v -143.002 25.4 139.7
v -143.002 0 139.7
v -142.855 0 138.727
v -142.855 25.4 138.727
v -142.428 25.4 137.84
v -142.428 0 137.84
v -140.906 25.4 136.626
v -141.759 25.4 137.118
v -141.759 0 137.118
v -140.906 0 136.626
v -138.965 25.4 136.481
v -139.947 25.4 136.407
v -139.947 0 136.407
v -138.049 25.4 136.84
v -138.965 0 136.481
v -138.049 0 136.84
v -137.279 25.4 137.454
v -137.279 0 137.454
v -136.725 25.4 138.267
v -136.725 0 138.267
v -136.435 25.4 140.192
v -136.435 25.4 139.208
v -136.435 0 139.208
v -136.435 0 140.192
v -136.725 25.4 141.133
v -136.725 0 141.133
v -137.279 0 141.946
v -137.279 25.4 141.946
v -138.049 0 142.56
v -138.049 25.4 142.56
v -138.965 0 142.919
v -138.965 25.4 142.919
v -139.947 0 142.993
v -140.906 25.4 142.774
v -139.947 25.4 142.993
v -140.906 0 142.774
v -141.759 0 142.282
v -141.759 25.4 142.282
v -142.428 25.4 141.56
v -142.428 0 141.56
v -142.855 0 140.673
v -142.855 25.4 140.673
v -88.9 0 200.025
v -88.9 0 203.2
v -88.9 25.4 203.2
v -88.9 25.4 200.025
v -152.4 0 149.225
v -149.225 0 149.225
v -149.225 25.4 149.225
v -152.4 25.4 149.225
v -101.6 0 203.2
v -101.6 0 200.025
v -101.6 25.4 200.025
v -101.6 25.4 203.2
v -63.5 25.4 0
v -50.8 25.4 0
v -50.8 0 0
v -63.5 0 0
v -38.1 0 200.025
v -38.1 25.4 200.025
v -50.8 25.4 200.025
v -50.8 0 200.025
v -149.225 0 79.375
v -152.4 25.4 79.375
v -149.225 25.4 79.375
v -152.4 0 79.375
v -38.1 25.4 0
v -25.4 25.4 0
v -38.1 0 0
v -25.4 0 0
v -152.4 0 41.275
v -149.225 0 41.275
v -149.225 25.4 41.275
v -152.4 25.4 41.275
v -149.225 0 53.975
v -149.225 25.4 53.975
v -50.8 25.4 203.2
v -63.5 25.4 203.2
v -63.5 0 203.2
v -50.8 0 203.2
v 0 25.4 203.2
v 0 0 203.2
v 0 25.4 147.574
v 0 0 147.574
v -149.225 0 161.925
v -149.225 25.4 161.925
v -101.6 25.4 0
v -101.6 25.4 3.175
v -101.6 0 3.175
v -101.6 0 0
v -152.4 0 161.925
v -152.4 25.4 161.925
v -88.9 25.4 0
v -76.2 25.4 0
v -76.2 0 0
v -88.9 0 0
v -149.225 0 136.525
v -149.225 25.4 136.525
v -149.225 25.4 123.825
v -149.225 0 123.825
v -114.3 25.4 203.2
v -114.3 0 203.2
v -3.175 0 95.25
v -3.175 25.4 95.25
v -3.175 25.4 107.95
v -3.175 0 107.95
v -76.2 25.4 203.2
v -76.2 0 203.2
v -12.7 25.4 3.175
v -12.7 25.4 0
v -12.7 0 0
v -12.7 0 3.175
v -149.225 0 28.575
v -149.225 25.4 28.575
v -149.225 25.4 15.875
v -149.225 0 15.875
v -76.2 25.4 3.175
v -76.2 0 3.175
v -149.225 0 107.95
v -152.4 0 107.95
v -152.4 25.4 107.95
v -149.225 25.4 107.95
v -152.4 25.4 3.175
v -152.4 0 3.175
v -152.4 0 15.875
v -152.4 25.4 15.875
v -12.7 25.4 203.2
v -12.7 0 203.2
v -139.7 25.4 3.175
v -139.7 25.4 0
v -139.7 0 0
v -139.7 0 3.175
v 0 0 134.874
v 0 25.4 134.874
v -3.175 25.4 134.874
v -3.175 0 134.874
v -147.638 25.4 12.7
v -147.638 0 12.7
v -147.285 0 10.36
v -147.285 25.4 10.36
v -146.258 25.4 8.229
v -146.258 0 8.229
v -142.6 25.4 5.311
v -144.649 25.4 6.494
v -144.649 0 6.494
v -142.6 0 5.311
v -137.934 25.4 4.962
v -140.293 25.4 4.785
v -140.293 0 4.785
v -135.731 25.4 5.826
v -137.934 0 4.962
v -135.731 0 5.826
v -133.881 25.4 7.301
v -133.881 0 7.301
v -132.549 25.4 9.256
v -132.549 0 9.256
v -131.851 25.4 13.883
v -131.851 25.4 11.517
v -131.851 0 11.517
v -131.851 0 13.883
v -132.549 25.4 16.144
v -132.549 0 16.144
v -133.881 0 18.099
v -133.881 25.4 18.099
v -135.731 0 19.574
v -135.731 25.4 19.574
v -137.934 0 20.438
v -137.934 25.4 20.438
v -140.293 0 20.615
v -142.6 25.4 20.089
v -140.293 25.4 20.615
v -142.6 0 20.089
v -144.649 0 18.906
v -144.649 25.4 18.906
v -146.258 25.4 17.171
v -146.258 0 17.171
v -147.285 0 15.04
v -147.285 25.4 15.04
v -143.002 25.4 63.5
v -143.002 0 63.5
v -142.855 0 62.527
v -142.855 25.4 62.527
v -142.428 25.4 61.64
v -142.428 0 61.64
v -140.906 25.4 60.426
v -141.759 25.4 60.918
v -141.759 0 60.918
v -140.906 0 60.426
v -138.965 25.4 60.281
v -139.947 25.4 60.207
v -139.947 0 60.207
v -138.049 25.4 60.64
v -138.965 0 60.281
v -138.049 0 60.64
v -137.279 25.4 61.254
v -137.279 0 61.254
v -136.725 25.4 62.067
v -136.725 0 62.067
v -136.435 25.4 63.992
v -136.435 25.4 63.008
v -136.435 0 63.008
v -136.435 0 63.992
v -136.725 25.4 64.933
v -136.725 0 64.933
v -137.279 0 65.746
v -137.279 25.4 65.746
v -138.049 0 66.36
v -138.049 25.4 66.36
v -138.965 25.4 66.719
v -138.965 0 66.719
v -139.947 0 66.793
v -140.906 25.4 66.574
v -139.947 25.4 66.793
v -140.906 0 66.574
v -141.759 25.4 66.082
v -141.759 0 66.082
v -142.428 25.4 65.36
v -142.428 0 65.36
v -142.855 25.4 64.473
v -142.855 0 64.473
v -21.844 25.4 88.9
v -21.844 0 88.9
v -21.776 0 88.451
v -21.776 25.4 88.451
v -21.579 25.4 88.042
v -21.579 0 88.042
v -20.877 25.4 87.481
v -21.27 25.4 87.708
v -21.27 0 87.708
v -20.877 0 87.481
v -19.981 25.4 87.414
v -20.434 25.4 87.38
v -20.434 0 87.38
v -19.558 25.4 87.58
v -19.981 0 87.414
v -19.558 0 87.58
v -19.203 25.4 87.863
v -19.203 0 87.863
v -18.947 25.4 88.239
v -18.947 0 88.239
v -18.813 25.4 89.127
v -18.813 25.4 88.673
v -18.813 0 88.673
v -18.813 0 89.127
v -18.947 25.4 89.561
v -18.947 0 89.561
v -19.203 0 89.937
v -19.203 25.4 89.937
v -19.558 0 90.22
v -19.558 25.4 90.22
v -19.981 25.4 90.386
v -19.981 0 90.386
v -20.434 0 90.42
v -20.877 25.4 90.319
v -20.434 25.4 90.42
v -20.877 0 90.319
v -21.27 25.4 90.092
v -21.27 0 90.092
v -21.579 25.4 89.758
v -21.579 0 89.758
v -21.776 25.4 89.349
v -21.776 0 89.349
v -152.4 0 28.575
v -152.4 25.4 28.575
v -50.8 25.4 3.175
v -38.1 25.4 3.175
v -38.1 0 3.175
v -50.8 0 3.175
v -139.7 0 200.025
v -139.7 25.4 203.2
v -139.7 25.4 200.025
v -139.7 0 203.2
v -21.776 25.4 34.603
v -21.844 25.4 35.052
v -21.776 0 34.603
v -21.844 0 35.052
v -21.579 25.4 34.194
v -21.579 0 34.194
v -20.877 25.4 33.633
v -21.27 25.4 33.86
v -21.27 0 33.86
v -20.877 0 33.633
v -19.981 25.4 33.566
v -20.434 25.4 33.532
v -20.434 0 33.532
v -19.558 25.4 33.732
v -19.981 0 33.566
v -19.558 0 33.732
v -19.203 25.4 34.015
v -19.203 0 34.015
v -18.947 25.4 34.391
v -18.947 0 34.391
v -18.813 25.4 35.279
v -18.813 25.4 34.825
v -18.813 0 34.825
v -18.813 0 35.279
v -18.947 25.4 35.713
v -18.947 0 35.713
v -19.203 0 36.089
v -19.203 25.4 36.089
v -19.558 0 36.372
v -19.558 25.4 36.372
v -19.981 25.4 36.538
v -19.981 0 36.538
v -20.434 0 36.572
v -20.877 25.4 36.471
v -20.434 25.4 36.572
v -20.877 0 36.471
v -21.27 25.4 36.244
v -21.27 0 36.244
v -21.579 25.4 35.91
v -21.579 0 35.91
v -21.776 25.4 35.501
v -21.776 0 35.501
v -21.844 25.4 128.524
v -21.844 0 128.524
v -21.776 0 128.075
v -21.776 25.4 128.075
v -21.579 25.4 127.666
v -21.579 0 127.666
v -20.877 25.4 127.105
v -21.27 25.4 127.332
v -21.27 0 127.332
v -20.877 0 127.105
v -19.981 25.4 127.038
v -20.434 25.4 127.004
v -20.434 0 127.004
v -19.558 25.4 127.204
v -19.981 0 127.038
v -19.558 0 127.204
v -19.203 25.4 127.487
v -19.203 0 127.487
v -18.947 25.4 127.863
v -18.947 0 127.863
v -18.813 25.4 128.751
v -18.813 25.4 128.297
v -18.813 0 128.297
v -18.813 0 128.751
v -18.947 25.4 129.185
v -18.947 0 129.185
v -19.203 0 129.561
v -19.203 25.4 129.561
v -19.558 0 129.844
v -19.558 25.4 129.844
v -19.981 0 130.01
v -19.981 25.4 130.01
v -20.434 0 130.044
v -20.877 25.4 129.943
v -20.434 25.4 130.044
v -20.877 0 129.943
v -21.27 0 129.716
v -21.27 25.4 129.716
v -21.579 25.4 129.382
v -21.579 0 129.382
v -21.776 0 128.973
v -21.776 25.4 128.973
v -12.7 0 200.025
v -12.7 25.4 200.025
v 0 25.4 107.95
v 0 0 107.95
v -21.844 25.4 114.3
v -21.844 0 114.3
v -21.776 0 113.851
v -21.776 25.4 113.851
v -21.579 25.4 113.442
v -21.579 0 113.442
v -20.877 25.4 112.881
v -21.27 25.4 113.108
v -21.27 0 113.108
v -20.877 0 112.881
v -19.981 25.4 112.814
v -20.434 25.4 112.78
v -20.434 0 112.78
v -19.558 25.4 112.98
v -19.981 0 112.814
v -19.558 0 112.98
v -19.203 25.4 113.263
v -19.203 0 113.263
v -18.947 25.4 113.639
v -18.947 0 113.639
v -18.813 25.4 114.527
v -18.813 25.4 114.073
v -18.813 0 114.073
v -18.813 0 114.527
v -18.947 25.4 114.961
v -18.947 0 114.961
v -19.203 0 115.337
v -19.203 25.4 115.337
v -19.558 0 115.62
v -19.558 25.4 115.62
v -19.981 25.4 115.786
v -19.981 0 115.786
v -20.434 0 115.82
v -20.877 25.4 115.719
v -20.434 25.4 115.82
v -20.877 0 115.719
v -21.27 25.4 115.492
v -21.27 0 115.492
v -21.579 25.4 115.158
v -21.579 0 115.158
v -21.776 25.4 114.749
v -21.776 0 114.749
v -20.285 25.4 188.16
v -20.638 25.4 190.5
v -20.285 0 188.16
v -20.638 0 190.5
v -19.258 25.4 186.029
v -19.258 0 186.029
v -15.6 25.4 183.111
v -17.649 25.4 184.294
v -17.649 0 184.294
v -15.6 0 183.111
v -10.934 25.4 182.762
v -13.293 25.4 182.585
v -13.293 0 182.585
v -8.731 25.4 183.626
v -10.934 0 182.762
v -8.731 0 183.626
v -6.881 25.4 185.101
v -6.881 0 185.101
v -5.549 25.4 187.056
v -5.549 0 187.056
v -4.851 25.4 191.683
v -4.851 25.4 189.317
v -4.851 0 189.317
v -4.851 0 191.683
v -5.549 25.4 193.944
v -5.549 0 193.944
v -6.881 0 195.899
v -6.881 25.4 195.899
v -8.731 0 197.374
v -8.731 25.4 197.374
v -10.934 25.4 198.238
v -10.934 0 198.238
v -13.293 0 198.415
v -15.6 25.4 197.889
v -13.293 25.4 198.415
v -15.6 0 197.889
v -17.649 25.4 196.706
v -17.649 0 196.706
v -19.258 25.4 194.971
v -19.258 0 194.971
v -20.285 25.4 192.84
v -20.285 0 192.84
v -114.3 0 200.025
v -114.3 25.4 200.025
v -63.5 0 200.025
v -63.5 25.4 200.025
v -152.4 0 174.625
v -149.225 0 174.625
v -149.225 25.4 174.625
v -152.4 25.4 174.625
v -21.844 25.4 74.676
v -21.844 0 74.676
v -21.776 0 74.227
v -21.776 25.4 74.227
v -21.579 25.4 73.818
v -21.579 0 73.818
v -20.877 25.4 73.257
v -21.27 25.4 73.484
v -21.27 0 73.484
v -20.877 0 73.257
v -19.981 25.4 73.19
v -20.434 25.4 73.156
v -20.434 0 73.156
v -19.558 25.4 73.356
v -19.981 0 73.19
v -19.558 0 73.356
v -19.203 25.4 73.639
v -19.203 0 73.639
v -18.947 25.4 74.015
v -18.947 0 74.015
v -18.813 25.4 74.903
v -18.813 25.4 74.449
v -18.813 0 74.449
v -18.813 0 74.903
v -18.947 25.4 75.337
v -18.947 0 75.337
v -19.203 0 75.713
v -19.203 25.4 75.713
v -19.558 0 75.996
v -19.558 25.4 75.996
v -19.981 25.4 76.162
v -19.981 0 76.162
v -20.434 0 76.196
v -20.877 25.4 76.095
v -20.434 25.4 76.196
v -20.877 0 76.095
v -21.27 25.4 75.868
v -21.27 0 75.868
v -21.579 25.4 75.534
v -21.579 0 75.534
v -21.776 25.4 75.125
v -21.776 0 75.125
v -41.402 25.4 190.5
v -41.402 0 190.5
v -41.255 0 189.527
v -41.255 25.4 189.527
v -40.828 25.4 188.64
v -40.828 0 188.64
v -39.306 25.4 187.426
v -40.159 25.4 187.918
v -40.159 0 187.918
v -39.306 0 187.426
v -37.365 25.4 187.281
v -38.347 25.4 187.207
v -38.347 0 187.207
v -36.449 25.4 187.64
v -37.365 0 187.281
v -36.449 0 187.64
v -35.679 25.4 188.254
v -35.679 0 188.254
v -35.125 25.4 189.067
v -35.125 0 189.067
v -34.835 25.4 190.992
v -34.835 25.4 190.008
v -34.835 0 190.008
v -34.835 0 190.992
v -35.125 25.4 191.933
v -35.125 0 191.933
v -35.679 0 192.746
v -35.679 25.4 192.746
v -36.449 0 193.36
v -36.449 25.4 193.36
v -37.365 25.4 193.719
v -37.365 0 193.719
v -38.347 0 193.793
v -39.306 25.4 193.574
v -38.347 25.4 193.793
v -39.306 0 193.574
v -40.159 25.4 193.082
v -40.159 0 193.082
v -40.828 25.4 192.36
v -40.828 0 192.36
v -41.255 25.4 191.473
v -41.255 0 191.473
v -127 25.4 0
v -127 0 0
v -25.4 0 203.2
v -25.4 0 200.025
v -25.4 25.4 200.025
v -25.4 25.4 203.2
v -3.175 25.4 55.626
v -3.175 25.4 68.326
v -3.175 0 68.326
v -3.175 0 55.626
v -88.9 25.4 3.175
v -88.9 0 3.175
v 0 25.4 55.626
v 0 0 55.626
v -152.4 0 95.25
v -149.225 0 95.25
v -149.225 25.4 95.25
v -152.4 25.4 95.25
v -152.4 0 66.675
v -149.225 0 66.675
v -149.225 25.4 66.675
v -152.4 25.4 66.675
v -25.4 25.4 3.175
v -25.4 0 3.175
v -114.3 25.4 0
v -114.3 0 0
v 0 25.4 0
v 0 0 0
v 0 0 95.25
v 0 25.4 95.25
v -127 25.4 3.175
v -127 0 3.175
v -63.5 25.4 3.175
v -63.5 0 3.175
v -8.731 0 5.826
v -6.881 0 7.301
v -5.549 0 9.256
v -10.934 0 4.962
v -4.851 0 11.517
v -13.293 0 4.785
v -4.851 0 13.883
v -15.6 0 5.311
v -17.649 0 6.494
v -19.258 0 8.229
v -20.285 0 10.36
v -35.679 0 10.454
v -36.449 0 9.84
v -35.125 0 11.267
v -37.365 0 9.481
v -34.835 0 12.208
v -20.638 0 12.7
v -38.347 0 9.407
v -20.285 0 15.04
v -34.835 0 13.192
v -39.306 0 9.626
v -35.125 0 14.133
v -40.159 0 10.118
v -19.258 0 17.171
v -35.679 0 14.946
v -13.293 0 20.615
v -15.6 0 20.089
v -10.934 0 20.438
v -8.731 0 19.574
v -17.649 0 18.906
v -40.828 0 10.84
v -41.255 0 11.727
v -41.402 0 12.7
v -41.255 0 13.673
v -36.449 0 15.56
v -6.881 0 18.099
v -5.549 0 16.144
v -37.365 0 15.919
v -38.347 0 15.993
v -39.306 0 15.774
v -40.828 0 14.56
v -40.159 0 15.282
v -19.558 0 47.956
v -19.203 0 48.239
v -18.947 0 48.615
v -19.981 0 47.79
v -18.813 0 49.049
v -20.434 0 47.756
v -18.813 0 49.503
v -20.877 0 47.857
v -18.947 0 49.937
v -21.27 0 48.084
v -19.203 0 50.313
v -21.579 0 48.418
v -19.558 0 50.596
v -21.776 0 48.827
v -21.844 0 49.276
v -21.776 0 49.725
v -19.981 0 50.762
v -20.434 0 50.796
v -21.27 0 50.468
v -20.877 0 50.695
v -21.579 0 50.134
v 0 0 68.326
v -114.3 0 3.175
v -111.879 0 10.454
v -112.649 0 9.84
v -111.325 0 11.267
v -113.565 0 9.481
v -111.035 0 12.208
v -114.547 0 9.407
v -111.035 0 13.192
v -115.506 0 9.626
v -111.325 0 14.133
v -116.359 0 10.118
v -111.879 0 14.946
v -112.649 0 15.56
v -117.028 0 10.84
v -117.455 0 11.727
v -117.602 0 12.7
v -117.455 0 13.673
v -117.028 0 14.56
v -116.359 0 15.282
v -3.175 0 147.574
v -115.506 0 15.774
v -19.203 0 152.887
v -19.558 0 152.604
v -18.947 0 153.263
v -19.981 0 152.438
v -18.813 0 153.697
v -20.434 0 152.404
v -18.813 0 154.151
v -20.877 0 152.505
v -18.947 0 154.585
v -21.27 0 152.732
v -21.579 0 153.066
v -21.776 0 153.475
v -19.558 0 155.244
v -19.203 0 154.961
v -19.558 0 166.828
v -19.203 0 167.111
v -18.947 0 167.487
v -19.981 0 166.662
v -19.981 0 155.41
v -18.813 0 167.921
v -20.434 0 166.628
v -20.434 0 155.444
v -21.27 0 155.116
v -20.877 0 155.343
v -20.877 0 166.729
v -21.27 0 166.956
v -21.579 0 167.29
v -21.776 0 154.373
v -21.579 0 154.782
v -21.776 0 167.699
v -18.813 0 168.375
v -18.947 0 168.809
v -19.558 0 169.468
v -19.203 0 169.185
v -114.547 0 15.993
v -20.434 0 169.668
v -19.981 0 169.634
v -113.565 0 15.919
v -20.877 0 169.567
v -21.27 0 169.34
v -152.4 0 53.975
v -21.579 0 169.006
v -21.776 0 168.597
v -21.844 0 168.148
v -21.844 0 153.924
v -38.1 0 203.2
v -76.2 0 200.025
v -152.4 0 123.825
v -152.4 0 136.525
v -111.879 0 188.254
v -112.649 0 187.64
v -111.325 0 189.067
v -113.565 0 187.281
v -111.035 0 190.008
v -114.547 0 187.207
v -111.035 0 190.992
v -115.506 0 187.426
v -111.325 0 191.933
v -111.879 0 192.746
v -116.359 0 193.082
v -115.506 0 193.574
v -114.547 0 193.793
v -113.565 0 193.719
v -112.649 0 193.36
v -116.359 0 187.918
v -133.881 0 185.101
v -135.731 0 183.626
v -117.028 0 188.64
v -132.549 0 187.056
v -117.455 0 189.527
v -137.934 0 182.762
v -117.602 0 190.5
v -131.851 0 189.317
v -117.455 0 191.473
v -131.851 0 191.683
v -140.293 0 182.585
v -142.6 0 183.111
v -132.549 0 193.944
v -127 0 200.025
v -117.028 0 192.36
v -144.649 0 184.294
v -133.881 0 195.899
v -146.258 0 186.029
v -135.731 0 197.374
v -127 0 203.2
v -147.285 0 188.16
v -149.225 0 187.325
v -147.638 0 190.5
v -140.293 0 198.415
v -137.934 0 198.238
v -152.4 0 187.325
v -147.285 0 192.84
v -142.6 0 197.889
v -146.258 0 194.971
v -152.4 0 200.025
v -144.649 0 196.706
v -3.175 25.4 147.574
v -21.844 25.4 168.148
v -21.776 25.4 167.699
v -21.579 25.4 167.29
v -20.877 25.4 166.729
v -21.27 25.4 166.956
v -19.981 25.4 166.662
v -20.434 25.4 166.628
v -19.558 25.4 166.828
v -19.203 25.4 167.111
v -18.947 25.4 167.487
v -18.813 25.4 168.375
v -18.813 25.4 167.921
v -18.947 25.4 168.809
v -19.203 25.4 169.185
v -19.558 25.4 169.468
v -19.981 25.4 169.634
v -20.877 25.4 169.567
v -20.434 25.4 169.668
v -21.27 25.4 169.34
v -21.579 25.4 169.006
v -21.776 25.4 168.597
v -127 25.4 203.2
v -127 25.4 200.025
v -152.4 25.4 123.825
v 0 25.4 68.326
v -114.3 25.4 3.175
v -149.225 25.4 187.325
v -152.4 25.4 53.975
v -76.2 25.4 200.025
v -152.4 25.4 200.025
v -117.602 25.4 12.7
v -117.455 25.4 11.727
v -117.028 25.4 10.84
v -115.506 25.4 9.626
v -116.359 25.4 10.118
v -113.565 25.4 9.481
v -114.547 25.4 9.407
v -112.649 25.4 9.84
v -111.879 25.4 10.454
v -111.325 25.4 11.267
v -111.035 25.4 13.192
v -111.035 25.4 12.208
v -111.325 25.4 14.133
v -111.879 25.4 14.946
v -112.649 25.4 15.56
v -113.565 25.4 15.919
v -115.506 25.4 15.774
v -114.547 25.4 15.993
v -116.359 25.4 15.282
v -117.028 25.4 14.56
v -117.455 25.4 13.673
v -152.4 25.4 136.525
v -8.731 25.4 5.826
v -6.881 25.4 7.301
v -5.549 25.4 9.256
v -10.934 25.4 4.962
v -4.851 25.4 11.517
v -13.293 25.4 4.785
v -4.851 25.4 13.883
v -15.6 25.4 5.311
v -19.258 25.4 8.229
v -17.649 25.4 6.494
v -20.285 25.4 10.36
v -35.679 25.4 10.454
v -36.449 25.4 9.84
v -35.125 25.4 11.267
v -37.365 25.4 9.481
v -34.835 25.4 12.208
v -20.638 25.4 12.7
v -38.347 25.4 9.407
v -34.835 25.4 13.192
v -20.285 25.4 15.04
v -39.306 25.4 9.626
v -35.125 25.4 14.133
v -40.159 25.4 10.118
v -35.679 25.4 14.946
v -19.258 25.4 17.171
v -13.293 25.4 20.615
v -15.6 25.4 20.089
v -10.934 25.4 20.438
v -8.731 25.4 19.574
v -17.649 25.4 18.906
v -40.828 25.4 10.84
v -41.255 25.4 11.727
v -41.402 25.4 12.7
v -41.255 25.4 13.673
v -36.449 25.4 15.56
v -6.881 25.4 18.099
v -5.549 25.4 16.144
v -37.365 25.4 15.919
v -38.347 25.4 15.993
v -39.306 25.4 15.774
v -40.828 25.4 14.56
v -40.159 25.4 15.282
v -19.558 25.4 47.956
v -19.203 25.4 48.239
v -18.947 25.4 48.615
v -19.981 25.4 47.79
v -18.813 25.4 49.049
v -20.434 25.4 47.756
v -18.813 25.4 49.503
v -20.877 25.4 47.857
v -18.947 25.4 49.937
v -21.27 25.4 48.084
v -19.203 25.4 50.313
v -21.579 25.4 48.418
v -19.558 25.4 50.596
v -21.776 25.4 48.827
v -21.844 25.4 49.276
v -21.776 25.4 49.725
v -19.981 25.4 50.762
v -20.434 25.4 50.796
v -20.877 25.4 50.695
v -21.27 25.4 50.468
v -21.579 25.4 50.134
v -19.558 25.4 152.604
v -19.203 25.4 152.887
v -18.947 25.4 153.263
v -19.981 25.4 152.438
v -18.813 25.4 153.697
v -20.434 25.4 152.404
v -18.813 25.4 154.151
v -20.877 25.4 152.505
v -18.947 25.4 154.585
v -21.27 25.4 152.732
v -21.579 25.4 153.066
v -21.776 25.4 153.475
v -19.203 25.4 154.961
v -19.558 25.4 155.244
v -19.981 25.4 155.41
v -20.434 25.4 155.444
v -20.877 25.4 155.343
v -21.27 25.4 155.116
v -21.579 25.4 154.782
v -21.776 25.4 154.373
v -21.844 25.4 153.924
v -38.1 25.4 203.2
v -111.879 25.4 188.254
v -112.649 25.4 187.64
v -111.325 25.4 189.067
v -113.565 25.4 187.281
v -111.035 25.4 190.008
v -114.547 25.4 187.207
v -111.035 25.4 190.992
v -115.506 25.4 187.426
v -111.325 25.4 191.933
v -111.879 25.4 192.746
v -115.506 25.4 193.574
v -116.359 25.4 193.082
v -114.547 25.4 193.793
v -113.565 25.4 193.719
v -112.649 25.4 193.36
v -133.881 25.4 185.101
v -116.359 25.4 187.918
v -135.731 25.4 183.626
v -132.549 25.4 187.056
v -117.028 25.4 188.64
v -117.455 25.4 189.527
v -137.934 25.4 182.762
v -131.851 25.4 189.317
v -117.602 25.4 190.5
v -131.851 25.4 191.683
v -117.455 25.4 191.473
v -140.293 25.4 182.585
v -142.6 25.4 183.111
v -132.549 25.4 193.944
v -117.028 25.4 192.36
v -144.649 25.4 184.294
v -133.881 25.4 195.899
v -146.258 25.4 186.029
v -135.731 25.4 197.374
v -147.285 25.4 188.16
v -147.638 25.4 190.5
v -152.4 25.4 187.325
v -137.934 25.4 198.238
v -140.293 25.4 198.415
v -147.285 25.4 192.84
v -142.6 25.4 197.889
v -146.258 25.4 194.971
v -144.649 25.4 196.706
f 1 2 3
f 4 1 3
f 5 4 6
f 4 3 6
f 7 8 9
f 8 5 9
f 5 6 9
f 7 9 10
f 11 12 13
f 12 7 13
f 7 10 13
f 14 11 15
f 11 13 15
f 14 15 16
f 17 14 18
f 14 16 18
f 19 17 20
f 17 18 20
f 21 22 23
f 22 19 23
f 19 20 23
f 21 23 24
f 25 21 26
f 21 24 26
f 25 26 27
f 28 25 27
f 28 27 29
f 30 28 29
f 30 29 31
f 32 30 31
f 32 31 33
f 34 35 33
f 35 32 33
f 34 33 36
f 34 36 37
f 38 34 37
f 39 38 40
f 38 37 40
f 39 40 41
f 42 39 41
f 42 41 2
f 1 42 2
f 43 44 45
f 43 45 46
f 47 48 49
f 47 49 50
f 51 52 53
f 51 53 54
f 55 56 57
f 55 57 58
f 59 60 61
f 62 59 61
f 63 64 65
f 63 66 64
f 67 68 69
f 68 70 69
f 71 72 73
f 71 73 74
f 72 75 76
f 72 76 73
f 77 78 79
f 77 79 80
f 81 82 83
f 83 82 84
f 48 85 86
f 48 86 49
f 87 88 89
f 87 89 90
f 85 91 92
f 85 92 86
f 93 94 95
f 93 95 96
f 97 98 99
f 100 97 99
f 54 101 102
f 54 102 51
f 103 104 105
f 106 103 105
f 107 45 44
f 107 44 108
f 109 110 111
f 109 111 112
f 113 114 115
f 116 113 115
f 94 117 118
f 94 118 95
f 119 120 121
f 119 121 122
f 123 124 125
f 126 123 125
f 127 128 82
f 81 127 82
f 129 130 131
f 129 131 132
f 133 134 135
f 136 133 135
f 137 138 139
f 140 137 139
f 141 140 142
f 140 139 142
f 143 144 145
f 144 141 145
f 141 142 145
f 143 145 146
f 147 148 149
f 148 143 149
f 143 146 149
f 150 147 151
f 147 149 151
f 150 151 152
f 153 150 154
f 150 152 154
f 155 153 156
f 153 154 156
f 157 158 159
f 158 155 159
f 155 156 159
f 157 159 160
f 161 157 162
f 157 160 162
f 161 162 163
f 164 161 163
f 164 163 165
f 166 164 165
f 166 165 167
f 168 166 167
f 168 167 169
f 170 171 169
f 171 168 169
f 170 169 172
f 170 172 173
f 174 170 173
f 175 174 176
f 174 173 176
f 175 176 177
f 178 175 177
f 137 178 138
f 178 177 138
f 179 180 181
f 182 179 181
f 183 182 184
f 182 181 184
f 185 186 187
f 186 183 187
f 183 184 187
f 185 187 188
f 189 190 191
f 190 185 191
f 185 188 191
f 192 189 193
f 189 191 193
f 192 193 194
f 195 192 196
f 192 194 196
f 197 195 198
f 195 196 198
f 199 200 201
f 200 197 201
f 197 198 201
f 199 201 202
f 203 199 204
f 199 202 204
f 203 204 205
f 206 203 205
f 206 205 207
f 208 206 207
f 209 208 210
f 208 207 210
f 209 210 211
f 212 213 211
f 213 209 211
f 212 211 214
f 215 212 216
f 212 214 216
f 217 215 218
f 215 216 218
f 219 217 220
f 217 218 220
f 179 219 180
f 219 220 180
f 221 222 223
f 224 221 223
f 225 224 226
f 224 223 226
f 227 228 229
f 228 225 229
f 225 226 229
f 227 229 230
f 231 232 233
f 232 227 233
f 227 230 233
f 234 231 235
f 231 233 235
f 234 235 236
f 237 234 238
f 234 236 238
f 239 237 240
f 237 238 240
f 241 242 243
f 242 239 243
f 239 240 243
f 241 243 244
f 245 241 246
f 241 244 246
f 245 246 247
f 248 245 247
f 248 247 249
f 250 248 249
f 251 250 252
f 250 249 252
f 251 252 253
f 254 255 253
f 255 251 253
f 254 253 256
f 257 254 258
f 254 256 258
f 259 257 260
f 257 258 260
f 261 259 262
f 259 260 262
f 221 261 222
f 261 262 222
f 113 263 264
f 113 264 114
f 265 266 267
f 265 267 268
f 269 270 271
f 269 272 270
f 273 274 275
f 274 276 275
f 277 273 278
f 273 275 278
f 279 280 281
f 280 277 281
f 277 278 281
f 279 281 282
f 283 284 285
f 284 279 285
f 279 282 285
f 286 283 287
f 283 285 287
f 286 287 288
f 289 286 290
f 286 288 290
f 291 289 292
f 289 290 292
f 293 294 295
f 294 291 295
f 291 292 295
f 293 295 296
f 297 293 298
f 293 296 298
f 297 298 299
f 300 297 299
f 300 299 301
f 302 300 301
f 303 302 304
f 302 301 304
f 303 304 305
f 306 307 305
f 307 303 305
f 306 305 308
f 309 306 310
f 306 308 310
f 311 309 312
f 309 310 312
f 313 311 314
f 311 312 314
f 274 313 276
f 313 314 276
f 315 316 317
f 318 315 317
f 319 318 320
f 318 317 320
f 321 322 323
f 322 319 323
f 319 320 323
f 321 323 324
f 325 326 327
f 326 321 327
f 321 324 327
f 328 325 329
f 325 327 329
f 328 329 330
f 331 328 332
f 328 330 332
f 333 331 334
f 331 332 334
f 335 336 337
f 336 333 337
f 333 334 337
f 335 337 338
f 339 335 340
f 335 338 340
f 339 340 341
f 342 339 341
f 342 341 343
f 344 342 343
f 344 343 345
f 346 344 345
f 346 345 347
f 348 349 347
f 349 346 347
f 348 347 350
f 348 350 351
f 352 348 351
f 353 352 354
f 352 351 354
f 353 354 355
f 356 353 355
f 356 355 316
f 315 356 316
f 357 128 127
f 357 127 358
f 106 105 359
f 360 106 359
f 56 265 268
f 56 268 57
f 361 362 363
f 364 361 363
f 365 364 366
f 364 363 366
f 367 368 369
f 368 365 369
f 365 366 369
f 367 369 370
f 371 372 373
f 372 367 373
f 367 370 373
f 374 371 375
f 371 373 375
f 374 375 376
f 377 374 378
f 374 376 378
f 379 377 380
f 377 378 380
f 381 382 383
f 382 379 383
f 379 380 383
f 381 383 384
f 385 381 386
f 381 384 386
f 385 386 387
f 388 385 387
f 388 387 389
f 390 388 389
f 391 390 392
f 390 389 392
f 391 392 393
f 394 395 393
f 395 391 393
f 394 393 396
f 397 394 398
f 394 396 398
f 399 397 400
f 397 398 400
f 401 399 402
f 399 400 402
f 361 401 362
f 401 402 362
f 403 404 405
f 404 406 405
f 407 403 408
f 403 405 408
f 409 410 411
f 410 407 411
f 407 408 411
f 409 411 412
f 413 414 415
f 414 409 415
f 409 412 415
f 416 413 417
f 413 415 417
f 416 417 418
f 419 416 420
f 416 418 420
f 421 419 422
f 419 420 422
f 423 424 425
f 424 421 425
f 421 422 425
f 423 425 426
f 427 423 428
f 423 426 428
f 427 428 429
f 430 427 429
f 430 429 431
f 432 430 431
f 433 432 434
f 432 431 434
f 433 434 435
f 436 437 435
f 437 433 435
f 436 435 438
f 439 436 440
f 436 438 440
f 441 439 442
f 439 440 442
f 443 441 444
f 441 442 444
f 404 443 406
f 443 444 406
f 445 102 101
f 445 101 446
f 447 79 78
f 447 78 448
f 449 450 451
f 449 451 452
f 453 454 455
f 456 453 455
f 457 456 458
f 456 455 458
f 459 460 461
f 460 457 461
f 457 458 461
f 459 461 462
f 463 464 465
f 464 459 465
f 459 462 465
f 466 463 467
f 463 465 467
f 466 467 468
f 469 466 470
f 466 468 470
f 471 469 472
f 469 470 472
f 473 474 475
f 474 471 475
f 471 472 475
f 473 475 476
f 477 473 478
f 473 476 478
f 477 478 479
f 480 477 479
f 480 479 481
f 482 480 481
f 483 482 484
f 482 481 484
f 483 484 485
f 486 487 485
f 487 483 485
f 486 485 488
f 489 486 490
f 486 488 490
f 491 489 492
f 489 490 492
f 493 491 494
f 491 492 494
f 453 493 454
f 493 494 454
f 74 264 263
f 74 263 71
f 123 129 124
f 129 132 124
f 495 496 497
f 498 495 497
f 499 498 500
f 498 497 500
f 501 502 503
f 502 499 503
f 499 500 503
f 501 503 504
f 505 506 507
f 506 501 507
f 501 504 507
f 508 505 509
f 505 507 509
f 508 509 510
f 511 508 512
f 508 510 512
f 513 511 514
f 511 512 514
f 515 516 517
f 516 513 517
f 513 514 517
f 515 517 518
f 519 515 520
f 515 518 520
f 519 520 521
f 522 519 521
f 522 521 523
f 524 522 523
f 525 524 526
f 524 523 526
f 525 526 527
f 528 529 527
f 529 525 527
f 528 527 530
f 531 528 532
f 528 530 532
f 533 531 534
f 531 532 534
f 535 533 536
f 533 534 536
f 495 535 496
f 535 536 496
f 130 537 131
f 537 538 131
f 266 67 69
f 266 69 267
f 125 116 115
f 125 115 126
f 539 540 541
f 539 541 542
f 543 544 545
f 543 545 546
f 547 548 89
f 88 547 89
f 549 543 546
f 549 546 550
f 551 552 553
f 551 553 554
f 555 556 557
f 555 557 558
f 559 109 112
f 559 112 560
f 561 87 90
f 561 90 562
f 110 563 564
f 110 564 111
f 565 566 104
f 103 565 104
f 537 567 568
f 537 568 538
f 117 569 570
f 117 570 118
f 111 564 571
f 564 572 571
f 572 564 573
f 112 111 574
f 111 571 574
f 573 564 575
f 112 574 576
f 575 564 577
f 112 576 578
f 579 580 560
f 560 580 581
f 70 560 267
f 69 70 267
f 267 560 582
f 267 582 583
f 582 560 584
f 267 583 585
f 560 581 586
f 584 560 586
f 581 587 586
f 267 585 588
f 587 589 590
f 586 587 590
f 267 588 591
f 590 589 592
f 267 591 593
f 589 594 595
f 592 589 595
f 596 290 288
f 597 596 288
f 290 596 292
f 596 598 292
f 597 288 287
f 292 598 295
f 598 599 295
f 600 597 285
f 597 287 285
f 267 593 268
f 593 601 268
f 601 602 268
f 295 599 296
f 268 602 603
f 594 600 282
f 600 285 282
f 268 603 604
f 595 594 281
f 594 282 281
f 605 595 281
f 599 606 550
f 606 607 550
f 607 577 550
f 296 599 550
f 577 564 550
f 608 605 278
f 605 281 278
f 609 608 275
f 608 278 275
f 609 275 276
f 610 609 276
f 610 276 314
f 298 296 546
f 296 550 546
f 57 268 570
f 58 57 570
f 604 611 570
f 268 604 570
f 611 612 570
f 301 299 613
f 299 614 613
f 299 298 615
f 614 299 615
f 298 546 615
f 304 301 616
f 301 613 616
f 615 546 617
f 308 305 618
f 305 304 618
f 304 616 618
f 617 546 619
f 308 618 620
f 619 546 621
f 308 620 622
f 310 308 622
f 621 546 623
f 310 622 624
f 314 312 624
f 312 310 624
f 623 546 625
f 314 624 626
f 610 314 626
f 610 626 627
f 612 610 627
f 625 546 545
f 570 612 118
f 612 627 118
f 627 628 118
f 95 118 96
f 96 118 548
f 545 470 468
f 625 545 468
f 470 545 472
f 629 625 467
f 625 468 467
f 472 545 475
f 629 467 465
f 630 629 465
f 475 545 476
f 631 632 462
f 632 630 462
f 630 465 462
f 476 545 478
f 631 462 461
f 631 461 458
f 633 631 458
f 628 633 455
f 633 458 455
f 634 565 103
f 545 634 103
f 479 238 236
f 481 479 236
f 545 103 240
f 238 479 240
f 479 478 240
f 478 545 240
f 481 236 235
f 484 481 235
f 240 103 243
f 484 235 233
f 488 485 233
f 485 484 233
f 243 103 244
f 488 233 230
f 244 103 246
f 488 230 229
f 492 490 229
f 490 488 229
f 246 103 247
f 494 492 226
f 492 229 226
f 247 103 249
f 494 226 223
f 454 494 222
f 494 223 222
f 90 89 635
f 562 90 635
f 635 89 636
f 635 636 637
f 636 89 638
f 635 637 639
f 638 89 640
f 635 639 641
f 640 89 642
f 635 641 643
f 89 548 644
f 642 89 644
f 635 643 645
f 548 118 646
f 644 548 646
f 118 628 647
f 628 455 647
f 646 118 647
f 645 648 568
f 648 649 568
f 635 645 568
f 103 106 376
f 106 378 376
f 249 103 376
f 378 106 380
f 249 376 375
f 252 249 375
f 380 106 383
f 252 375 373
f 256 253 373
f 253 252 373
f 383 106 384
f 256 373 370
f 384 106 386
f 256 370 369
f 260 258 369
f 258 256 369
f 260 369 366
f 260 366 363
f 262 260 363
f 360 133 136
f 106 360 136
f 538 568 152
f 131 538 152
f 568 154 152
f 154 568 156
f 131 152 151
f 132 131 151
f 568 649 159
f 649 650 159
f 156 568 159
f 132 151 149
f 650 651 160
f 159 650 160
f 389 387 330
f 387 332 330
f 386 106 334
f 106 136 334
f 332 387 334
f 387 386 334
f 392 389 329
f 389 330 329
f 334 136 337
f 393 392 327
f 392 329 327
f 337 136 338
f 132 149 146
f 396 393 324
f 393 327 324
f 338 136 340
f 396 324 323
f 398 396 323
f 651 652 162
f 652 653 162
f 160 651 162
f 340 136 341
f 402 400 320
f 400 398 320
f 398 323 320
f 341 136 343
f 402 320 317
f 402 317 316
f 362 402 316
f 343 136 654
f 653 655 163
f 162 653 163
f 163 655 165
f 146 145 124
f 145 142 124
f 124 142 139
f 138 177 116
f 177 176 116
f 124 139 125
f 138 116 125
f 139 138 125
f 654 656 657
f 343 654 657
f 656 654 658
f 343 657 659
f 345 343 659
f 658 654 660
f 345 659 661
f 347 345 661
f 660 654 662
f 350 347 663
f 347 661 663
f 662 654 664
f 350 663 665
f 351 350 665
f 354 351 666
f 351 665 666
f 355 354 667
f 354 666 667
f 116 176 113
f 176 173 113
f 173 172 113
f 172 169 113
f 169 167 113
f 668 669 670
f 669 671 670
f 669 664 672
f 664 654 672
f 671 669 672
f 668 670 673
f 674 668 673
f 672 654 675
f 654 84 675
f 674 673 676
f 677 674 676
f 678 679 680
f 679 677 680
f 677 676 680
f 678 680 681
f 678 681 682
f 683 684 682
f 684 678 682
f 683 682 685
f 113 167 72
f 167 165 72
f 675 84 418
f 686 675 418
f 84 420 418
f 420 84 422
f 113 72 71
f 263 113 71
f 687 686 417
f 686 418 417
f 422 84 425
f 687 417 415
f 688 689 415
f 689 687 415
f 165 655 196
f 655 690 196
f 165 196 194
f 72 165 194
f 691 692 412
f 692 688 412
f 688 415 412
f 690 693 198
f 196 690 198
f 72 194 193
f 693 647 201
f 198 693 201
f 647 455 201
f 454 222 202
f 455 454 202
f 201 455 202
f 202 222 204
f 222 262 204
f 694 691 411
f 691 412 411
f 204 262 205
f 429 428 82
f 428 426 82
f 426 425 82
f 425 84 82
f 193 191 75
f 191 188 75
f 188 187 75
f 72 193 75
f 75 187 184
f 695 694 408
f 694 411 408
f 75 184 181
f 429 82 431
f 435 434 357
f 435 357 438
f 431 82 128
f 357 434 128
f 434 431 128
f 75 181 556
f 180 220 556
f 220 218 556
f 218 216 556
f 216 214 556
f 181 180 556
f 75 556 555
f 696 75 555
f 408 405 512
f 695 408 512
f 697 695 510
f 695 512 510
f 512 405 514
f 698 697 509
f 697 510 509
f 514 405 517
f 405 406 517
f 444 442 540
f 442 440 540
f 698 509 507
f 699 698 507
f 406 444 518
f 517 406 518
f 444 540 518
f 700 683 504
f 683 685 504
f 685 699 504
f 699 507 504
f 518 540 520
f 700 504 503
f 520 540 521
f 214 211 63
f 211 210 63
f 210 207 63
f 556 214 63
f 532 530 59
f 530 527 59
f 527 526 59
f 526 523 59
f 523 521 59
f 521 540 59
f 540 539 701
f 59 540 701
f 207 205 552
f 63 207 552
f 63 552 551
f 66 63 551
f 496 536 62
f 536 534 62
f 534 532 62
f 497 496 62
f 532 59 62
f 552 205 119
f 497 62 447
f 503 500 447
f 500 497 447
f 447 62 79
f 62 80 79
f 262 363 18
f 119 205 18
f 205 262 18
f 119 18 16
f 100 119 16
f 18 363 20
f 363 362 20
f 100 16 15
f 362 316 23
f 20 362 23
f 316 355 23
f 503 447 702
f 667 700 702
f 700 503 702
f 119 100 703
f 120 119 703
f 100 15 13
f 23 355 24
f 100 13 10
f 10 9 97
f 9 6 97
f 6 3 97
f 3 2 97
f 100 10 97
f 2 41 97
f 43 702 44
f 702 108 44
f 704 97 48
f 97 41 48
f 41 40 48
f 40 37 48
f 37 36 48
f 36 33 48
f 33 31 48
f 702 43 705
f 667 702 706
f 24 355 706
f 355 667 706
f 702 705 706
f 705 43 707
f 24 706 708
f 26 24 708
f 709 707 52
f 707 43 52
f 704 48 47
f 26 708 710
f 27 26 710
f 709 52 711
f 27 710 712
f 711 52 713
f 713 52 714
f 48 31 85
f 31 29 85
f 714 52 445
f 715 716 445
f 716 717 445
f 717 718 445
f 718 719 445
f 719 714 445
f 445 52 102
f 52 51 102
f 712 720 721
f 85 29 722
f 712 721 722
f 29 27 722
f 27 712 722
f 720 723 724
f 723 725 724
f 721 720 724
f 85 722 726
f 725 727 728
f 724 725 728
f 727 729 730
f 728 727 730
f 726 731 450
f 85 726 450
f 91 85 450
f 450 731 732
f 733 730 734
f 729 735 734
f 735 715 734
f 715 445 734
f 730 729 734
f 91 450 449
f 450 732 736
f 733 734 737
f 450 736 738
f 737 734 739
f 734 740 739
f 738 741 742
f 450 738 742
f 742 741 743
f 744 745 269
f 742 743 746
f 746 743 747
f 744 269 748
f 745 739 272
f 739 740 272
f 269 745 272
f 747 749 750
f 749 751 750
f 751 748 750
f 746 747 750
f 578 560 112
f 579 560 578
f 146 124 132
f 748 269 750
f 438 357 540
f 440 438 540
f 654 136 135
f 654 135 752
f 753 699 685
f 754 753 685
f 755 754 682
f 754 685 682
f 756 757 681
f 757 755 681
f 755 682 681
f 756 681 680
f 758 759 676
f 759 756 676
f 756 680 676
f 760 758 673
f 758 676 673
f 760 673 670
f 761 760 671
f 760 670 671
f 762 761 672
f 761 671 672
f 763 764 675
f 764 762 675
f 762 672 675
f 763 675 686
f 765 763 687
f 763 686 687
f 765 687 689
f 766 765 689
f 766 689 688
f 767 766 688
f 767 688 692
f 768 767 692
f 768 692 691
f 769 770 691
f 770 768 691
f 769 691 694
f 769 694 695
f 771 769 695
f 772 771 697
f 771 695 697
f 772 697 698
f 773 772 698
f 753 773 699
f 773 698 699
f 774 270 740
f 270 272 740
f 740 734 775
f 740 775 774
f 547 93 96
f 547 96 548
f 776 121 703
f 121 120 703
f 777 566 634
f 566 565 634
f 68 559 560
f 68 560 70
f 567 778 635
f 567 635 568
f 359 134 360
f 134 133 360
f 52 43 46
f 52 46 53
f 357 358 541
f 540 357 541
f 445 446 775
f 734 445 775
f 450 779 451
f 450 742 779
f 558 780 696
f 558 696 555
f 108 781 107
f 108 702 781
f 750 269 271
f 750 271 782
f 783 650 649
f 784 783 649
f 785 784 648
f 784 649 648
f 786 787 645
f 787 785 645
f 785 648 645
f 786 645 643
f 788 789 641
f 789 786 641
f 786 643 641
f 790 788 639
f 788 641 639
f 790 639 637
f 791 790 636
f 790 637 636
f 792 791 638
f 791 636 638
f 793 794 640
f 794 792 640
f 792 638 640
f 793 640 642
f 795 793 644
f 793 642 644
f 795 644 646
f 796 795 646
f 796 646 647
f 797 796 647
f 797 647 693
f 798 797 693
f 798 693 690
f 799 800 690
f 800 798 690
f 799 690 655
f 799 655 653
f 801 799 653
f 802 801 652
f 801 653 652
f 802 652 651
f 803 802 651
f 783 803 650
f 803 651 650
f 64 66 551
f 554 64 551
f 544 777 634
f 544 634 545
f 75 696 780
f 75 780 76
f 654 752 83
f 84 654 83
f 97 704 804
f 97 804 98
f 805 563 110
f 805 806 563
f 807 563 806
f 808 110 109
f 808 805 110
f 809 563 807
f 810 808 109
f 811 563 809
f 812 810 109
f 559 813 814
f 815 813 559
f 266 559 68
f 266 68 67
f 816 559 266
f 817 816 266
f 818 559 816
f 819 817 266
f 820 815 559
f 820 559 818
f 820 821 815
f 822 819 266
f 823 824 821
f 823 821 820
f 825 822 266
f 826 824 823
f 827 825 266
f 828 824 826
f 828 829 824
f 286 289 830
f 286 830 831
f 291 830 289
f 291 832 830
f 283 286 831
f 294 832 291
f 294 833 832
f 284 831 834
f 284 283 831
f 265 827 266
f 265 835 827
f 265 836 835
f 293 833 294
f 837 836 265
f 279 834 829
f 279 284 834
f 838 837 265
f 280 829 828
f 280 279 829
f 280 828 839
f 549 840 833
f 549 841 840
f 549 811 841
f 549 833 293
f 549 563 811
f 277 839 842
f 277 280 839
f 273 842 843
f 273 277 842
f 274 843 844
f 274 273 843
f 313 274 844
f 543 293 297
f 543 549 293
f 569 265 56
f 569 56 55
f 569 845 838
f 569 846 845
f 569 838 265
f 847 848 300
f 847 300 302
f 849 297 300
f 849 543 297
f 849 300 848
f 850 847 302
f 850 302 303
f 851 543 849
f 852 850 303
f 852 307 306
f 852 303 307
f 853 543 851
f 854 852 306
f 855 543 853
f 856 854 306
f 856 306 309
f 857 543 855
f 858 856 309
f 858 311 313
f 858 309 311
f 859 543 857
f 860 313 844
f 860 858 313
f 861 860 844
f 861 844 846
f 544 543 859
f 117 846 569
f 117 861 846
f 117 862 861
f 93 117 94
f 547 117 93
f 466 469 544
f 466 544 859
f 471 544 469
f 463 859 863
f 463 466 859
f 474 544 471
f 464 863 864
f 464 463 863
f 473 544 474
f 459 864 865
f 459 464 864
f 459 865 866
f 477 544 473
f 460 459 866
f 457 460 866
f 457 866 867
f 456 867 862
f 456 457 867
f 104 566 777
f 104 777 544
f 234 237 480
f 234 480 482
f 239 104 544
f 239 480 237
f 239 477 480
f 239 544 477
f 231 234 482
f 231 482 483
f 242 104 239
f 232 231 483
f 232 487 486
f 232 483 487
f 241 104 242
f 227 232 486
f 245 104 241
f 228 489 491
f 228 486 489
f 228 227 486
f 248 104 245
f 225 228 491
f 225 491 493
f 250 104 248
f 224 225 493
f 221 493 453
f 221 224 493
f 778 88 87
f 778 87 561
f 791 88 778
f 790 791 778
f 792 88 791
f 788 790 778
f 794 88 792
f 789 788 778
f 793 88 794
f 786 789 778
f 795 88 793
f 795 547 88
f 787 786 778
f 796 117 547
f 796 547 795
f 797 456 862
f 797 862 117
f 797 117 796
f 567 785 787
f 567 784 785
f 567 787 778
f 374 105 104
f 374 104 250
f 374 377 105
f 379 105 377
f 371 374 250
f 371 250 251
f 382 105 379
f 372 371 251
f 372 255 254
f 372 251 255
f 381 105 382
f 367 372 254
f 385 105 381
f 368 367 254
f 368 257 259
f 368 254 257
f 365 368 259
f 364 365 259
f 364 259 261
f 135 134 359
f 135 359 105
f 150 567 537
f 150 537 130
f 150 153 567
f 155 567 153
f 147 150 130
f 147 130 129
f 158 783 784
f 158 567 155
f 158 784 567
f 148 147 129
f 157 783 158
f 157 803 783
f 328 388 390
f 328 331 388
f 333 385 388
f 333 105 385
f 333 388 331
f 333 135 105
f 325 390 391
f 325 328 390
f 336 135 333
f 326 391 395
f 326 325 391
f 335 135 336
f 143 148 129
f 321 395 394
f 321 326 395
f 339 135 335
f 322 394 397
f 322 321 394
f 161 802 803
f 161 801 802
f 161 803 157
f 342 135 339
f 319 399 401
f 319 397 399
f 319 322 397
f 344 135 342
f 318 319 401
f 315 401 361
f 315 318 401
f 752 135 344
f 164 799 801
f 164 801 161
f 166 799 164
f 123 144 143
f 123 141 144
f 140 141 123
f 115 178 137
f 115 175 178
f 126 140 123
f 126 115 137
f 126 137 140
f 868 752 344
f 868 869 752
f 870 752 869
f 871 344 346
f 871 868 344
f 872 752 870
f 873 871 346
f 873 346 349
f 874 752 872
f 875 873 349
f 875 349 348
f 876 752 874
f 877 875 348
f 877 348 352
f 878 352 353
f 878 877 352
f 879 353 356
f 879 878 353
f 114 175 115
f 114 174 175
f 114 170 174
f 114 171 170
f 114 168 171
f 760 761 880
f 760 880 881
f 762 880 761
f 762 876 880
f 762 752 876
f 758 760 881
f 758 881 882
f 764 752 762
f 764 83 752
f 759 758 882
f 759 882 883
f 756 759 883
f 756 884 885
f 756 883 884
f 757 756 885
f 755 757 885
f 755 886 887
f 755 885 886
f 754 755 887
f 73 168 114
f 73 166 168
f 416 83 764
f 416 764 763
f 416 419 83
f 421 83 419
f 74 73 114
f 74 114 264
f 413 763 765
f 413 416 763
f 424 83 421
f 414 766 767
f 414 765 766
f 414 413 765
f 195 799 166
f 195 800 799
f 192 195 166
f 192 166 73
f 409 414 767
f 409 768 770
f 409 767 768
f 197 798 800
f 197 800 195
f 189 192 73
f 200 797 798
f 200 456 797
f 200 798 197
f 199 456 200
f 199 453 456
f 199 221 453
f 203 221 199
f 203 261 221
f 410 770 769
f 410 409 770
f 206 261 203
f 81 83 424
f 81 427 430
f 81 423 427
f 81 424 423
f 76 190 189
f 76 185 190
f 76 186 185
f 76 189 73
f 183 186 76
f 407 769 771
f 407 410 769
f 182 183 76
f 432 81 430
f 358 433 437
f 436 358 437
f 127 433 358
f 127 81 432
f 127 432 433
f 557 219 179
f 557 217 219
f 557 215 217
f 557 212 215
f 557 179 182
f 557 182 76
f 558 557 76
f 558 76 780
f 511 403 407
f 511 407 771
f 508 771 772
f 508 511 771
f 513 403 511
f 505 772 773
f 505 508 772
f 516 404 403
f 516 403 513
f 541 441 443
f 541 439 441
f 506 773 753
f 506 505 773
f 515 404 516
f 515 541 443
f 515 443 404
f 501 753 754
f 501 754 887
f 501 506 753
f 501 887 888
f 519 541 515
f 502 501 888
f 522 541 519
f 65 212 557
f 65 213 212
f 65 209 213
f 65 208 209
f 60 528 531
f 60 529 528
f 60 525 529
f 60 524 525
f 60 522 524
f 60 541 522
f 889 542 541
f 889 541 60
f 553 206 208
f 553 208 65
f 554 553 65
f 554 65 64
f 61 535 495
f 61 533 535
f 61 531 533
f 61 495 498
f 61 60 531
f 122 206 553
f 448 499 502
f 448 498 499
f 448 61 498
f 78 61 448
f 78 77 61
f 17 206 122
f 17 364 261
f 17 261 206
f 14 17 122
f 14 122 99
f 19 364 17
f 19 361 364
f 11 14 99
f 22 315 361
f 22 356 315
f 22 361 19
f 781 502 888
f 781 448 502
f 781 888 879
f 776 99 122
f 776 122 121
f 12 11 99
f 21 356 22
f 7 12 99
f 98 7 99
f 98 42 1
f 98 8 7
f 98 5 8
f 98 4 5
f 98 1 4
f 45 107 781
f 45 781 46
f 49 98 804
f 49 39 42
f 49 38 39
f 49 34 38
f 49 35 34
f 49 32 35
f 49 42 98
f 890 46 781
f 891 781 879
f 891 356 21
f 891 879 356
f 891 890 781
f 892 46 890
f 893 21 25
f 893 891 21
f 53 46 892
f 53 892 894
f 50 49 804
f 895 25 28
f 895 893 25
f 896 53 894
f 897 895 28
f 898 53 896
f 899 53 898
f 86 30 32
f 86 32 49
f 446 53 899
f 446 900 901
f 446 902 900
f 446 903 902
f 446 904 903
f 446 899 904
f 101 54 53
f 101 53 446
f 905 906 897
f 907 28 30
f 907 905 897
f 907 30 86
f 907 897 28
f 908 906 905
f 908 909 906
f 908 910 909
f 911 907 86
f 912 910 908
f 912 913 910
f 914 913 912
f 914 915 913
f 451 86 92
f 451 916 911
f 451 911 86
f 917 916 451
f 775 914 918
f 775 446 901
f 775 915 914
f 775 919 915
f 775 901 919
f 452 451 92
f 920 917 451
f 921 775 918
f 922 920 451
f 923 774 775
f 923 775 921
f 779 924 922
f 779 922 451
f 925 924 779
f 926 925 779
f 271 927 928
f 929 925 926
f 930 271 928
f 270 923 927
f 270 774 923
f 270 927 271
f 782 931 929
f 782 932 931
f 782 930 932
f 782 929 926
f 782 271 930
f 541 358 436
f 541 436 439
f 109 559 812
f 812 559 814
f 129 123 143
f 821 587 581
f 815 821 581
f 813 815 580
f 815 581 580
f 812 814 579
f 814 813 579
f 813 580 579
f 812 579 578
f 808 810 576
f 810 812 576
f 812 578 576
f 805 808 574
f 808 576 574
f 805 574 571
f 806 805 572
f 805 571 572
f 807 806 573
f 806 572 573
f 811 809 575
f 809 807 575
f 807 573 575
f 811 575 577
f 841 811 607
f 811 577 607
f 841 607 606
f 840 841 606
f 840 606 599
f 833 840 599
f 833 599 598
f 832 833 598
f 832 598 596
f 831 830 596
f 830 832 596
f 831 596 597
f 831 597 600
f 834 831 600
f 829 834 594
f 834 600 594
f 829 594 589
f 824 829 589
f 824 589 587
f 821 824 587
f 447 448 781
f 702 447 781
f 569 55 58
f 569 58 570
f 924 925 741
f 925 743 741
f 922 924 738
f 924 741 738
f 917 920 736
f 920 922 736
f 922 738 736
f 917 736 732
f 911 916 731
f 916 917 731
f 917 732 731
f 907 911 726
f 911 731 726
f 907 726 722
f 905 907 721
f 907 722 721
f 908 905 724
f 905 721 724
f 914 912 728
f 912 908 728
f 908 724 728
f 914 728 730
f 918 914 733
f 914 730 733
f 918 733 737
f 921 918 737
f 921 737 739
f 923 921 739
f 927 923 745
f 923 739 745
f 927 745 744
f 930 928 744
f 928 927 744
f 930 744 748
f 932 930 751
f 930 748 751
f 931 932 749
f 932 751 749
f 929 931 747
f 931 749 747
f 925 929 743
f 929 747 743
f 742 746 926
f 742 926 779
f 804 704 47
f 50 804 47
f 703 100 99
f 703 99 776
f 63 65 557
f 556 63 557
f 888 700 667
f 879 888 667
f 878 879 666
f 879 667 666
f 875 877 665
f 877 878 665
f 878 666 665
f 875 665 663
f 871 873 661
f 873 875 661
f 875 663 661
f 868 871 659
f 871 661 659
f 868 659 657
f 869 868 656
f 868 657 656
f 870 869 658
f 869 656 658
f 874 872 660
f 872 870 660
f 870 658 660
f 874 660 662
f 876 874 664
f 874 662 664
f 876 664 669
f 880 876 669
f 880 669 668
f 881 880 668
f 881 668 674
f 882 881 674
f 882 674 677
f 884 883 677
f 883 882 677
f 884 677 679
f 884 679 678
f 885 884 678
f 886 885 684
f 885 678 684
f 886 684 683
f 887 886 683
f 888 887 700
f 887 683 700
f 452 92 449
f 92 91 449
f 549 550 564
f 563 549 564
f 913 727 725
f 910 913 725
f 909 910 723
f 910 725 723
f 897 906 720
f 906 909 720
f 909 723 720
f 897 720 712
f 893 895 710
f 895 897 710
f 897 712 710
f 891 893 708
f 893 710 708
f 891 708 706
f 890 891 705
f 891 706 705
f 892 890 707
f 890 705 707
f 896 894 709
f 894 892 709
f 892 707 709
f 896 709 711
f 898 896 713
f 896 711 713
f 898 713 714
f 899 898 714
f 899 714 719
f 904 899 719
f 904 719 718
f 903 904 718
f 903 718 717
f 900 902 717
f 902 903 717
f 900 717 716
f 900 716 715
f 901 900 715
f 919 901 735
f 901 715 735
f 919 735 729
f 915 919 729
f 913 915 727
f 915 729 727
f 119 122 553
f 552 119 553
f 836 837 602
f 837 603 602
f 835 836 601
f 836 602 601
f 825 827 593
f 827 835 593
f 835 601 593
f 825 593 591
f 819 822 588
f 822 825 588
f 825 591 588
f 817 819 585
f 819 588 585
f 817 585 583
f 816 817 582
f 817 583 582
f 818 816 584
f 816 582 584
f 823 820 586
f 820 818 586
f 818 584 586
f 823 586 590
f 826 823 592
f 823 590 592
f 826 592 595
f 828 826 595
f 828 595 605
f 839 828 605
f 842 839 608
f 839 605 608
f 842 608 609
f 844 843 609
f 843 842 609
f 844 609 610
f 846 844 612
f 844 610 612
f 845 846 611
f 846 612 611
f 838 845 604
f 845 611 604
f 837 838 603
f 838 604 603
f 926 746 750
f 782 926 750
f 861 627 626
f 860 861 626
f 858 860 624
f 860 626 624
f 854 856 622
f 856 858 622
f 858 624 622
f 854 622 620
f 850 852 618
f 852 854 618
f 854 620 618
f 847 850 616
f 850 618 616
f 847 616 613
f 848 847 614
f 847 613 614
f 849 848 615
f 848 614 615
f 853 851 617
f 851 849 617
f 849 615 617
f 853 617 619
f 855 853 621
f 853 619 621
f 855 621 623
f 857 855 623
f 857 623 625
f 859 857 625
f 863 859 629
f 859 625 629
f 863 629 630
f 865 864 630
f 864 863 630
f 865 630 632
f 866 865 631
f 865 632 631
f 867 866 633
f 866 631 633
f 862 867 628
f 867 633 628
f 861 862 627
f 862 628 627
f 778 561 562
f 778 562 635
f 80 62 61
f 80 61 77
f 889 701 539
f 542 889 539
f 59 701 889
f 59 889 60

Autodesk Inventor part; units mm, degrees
ref_plane "YZ Plane" through (0, 0, 0) normal (1, 0, 0) x (0, 1, 0)
ref_plane "XZ Plane" through (0, 0, 0) normal (0, 1, 0) x (-1, 0, 0)
ref_plane "XY Plane" through (0, 0, 0) normal (0, 0, 1) x (1, 0, 0)
sketch "Sketch1" plane through (0, 0, 0) normal (0, 1, 0) x (-1, 0, 0)
  line L0 (0, 0) -> (152.4, 0)
  line L1 (152.4, 0) -> (152.4, 203.2)
  line L2 (152.4, 203.2) -> (0, 203.2)
  line L3 (0, 203.2) -> (0, 0)
  circle A0 centre (12.7, 190.5) radius 7.9375
  circle A1 centre (139.7, 190.5) radius 7.9375
  circle A2 centre (139.7, 12.7) radius 7.9375
  circle A3 centre (12.7, 12.7) radius 7.9375
  circle A4 centre (114.3, 190.5) radius 3.302
  circle A5 centre (38.1, 190.5) radius 3.302
  circle A6 centre (114.3, 12.7) radius 3.302
  circle A7 centre (38.1, 12.7) radius 3.302
  circle A8 centre (139.7, 139.7) radius 3.302
  circle A9 centre (139.7, 63.5) radius 3.302
  circle A10 centre (20.32, 168.148) radius 1.524
  circle A11 centre (20.32, 153.924) radius 1.524
  circle A12 centre (20.32, 128.524) radius 1.524
  circle A13 centre (20.32, 114.3) radius 1.524
  circle A14 centre (20.32, 88.9) radius 1.524
  circle A15 centre (20.32, 74.676) radius 1.524
  circle A16 centre (20.32, 49.276) radius 1.524
  circle A17 centre (20.32, 35.052) radius 1.524
  line L4 (152.4, 203.2) -> (139.7, 203.2)
  line L5 (139.7, 203.2) -> (139.7, 200.025)
  line L6 (139.7, 200.025) -> (152.4, 200.025)
  line L7 (152.4, 200.025) -> (152.4, 203.2)
  line L8 (127, 203.2) -> (114.3, 203.2)
  line L9 (114.3, 203.2) -> (114.3, 200.025)
  line L10 (114.3, 200.025) -> (127, 200.025)
  line L11 (127, 200.025) -> (127, 203.2)
  line L12 (101.6, 203.2) -> (88.9, 203.2)
  line L13 (88.9, 203.2) -> (88.9, 200.025)
  line L14 (88.9, 200.025) -> (101.6, 200.025)
  line L15 (101.6, 200.025) -> (101.6, 203.2)
  line L16 (76.2, 203.2) -> (63.5, 203.2)
  line L17 (63.5, 203.2) -> (63.5, 200.025)
  line L18 (63.5, 200.025) -> (76.2, 200.025)
  line L19 (76.2, 200.025) -> (76.2, 203.2)
  line L20 (50.8, 203.2) -> (38.1, 203.2)
  line L21 (38.1, 203.2) -> (38.1, 200.025)
  line L22 (38.1, 200.025) -> (50.8, 200.025)
  line L23 (50.8, 200.025) -> (50.8, 203.2)
  line L24 (25.4, 203.2) -> (12.7, 203.2)
  line L25 (12.7, 203.2) -> (12.7, 200.025)
  line L26 (12.7, 200.025) -> (25.4, 200.025)
  line L27 (25.4, 200.025) -> (25.4, 203.2)
  line L28 (152.4, 0) -> (139.7, 0)
  line L29 (139.7, 0) -> (139.7, 3.175)
  line L30 (139.7, 3.175) -> (152.4, 3.175)
  line L31 (152.4, 3.175) -> (152.4, 0)
  line L32 (127, 0) -> (114.3, 0)
  line L33 (114.3, 0) -> (114.3, 3.175)
  line L34 (114.3, 3.175) -> (127, 3.175)
  line L35 (127, 3.175) -> (127, 0)
  line L36 (101.6, 0) -> (88.9, 0)
  line L37 (88.9, 0) -> (88.9, 3.175)
  line L38 (88.9, 3.175) -> (101.6, 3.175)
  line L39 (101.6, 3.175) -> (101.6, 0)
  line L40 (76.2, 0) -> (63.5, 0)
  line L41 (63.5, 0) -> (63.5, 3.175)
  line L42 (63.5, 3.175) -> (76.2, 3.175)
  line L43 (76.2, 3.175) -> (76.2, 0)
  line L44 (50.8, 0) -> (38.1, 0)
  line L45 (38.1, 0) -> (38.1, 3.175)
  line L46 (38.1, 3.175) -> (50.8, 3.175)
  line L47 (50.8, 3.175) -> (50.8, 0)
  line L48 (25.4, 0) -> (12.7, 0)
  line L49 (12.7, 0) -> (12.7, 3.175)
  line L50 (12.7, 3.175) -> (25.4, 3.175)
  line L51 (25.4, 3.175) -> (25.4, 0)
  line L52 (152.4, 187.325) -> (149.225, 187.325)
  line L53 (149.225, 187.325) -> (149.225, 174.625)
  line L54 (149.225, 174.625) -> (152.4, 174.625)
  line L55 (152.4, 174.625) -> (152.4, 187.325)
  line L56 (152.4, 161.925) -> (149.225, 161.925)
  line L57 (149.225, 161.925) -> (149.225, 149.225)
  line L58 (149.225, 149.225) -> (152.4, 149.225)
  line L59 (152.4, 149.225) -> (152.4, 161.925)
  line L60 (152.4, 136.525) -> (149.225, 136.525)
  line L61 (149.225, 136.525) -> (149.225, 123.825)
  line L62 (149.225, 123.825) -> (152.4, 123.825)
  line L63 (152.4, 123.825) -> (152.4, 136.525)
  line L64 (152.4, 107.95) -> (149.225, 107.95)
  line L65 (149.225, 107.95) -> (149.225, 95.25)
  line L66 (149.225, 95.25) -> (152.4, 95.25)
  line L67 (152.4, 95.25) -> (152.4, 107.95)
  line L68 (152.4, 79.375) -> (149.225, 79.375)
  line L69 (149.225, 79.375) -> (149.225, 66.675)
  line L70 (149.225, 66.675) -> (152.4, 66.675)
  line L71 (152.4, 66.675) -> (152.4, 79.375)
  line L72 (152.4, 53.975) -> (149.225, 53.975)
  line L73 (149.225, 53.975) -> (149.225, 41.275)
  line L74 (149.225, 41.275) -> (152.4, 41.275)
  line L75 (152.4, 41.275) -> (152.4, 53.975)
  line L76 (152.4, 28.575) -> (149.225, 28.575)
  line L77 (149.225, 28.575) -> (149.225, 15.875)
  line L78 (149.225, 15.875) -> (152.4, 15.875)
  line L79 (152.4, 15.875) -> (152.4, 28.575)
  line L80 (0, 147.574) -> (0, 134.874)
  line L81 (0, 134.874) -> (3.175, 134.874)
  line L82 (3.175, 134.874) -> (3.175, 147.574)
  line L83 (3.175, 147.574) -> (0, 147.574)
  line L84 (0, 107.95) -> (0, 95.25)
  line L85 (0, 95.25) -> (3.175, 95.25)
  line L86 (3.175, 95.25) -> (3.175, 107.95)
  line L87 (3.175, 107.95) -> (0, 107.95)
  line L88 (0, 55.626) -> (0, 68.326)
  line L89 (0, 68.326) -> (3.175, 68.326)
  line L90 (3.175, 68.326) -> (3.175, 55.626)
  line L91 (3.175, 55.626) -> (0, 55.626)
  dimension "d0" = 152.4
  dimension "d1" = 203.2
  dimension "d40" = 15.875
  dimension "d41" = 15.875
  dimension "d42" = 15.875
  dimension "d43" = 15.875
  dimension "d44" = 12.7
  dimension "d45" = 12.7
  dimension "d46" = 12.7
  dimension "d47" = 12.7
  dimension "d48" = 12.7
  dimension "d49" = 12.7
  dimension "d50" = 12.7
  dimension "d51" = 12.7
  dimension "d52" = 177.8
  dimension "d53" = 127
  dimension "d54" = 6.604
  dimension "d55" = 6.604
  dimension "d56" = 25.4
  dimension "d57" = 25.4
  dimension "d58" = 12.7
  dimension "d59" = 12.7
  dimension "d60" = 6.604
  dimension "d61" = 6.604
  dimension "d62" = 12.7
  dimension "d63" = 12.7
  dimension "d64" = 25.4
  dimension "d65" = 25.4
  dimension "d66" = 6.604
  dimension "d67" = 6.604
  dimension "d68" = 50.8
  dimension "d69" = 50.8
  dimension "d70" = 12.7
  dimension "d71" = 12.7
  dimension "d72" = 3.048
  dimension "d73" = 3.048
  dimension "d74" = 3.048
  dimension "d75" = 3.048
  dimension "d76" = 3.048
  dimension "d77" = 3.048
  dimension "d78" = 20.32
  dimension "d79" = 20.32
  dimension "d80" = 20.32
  dimension "d81" = 20.32
  dimension "d82" = 20.32
  dimension "d83" = 20.32
  dimension "d84" = 22.352
  dimension "d85" = 14.224
  dimension "d86" = 25.4
  dimension "d87" = 14.224
  dimension "d88" = 25.4
  dimension "d89" = 14.224
  dimension "d90" = 3.048
  dimension "d91" = 3.048
  dimension "d92" = 25.4
  dimension "d93" = 14.224
  dimension "d97" = 12.7
  dimension "d98" = 3.175
  dimension "d99" = 12.7
  dimension "d100" = 3.175
  dimension "d101" = 12.7
  dimension "d102" = 3.175
  dimension "d103" = 12.7
  dimension "d104" = 3.175
extrude "Extrusion4" add sketch "Sketch1" along normal blind 25.4 contours L3 L91 L90 L89 L85 L86 L87 L81 L82 L83 L2 L25 L26 L27 L21 L22 L23 L17 L18 L19 L13 L14 L15 L9 L10 L11 L5 L6 L1 L52 L53 L54 L56 L57 L58 L60 L61 L62 L64 L65 L66 L68 L69 L70 L72 L73 L74 L76 L77 L78 L30 L29 L0 L35 L34 L33 L39 L38 L37 L43 L42 L41 L47 L46 L45 L51 L50 L49
properties part number "CasingBottomWithSlotsInFront"
